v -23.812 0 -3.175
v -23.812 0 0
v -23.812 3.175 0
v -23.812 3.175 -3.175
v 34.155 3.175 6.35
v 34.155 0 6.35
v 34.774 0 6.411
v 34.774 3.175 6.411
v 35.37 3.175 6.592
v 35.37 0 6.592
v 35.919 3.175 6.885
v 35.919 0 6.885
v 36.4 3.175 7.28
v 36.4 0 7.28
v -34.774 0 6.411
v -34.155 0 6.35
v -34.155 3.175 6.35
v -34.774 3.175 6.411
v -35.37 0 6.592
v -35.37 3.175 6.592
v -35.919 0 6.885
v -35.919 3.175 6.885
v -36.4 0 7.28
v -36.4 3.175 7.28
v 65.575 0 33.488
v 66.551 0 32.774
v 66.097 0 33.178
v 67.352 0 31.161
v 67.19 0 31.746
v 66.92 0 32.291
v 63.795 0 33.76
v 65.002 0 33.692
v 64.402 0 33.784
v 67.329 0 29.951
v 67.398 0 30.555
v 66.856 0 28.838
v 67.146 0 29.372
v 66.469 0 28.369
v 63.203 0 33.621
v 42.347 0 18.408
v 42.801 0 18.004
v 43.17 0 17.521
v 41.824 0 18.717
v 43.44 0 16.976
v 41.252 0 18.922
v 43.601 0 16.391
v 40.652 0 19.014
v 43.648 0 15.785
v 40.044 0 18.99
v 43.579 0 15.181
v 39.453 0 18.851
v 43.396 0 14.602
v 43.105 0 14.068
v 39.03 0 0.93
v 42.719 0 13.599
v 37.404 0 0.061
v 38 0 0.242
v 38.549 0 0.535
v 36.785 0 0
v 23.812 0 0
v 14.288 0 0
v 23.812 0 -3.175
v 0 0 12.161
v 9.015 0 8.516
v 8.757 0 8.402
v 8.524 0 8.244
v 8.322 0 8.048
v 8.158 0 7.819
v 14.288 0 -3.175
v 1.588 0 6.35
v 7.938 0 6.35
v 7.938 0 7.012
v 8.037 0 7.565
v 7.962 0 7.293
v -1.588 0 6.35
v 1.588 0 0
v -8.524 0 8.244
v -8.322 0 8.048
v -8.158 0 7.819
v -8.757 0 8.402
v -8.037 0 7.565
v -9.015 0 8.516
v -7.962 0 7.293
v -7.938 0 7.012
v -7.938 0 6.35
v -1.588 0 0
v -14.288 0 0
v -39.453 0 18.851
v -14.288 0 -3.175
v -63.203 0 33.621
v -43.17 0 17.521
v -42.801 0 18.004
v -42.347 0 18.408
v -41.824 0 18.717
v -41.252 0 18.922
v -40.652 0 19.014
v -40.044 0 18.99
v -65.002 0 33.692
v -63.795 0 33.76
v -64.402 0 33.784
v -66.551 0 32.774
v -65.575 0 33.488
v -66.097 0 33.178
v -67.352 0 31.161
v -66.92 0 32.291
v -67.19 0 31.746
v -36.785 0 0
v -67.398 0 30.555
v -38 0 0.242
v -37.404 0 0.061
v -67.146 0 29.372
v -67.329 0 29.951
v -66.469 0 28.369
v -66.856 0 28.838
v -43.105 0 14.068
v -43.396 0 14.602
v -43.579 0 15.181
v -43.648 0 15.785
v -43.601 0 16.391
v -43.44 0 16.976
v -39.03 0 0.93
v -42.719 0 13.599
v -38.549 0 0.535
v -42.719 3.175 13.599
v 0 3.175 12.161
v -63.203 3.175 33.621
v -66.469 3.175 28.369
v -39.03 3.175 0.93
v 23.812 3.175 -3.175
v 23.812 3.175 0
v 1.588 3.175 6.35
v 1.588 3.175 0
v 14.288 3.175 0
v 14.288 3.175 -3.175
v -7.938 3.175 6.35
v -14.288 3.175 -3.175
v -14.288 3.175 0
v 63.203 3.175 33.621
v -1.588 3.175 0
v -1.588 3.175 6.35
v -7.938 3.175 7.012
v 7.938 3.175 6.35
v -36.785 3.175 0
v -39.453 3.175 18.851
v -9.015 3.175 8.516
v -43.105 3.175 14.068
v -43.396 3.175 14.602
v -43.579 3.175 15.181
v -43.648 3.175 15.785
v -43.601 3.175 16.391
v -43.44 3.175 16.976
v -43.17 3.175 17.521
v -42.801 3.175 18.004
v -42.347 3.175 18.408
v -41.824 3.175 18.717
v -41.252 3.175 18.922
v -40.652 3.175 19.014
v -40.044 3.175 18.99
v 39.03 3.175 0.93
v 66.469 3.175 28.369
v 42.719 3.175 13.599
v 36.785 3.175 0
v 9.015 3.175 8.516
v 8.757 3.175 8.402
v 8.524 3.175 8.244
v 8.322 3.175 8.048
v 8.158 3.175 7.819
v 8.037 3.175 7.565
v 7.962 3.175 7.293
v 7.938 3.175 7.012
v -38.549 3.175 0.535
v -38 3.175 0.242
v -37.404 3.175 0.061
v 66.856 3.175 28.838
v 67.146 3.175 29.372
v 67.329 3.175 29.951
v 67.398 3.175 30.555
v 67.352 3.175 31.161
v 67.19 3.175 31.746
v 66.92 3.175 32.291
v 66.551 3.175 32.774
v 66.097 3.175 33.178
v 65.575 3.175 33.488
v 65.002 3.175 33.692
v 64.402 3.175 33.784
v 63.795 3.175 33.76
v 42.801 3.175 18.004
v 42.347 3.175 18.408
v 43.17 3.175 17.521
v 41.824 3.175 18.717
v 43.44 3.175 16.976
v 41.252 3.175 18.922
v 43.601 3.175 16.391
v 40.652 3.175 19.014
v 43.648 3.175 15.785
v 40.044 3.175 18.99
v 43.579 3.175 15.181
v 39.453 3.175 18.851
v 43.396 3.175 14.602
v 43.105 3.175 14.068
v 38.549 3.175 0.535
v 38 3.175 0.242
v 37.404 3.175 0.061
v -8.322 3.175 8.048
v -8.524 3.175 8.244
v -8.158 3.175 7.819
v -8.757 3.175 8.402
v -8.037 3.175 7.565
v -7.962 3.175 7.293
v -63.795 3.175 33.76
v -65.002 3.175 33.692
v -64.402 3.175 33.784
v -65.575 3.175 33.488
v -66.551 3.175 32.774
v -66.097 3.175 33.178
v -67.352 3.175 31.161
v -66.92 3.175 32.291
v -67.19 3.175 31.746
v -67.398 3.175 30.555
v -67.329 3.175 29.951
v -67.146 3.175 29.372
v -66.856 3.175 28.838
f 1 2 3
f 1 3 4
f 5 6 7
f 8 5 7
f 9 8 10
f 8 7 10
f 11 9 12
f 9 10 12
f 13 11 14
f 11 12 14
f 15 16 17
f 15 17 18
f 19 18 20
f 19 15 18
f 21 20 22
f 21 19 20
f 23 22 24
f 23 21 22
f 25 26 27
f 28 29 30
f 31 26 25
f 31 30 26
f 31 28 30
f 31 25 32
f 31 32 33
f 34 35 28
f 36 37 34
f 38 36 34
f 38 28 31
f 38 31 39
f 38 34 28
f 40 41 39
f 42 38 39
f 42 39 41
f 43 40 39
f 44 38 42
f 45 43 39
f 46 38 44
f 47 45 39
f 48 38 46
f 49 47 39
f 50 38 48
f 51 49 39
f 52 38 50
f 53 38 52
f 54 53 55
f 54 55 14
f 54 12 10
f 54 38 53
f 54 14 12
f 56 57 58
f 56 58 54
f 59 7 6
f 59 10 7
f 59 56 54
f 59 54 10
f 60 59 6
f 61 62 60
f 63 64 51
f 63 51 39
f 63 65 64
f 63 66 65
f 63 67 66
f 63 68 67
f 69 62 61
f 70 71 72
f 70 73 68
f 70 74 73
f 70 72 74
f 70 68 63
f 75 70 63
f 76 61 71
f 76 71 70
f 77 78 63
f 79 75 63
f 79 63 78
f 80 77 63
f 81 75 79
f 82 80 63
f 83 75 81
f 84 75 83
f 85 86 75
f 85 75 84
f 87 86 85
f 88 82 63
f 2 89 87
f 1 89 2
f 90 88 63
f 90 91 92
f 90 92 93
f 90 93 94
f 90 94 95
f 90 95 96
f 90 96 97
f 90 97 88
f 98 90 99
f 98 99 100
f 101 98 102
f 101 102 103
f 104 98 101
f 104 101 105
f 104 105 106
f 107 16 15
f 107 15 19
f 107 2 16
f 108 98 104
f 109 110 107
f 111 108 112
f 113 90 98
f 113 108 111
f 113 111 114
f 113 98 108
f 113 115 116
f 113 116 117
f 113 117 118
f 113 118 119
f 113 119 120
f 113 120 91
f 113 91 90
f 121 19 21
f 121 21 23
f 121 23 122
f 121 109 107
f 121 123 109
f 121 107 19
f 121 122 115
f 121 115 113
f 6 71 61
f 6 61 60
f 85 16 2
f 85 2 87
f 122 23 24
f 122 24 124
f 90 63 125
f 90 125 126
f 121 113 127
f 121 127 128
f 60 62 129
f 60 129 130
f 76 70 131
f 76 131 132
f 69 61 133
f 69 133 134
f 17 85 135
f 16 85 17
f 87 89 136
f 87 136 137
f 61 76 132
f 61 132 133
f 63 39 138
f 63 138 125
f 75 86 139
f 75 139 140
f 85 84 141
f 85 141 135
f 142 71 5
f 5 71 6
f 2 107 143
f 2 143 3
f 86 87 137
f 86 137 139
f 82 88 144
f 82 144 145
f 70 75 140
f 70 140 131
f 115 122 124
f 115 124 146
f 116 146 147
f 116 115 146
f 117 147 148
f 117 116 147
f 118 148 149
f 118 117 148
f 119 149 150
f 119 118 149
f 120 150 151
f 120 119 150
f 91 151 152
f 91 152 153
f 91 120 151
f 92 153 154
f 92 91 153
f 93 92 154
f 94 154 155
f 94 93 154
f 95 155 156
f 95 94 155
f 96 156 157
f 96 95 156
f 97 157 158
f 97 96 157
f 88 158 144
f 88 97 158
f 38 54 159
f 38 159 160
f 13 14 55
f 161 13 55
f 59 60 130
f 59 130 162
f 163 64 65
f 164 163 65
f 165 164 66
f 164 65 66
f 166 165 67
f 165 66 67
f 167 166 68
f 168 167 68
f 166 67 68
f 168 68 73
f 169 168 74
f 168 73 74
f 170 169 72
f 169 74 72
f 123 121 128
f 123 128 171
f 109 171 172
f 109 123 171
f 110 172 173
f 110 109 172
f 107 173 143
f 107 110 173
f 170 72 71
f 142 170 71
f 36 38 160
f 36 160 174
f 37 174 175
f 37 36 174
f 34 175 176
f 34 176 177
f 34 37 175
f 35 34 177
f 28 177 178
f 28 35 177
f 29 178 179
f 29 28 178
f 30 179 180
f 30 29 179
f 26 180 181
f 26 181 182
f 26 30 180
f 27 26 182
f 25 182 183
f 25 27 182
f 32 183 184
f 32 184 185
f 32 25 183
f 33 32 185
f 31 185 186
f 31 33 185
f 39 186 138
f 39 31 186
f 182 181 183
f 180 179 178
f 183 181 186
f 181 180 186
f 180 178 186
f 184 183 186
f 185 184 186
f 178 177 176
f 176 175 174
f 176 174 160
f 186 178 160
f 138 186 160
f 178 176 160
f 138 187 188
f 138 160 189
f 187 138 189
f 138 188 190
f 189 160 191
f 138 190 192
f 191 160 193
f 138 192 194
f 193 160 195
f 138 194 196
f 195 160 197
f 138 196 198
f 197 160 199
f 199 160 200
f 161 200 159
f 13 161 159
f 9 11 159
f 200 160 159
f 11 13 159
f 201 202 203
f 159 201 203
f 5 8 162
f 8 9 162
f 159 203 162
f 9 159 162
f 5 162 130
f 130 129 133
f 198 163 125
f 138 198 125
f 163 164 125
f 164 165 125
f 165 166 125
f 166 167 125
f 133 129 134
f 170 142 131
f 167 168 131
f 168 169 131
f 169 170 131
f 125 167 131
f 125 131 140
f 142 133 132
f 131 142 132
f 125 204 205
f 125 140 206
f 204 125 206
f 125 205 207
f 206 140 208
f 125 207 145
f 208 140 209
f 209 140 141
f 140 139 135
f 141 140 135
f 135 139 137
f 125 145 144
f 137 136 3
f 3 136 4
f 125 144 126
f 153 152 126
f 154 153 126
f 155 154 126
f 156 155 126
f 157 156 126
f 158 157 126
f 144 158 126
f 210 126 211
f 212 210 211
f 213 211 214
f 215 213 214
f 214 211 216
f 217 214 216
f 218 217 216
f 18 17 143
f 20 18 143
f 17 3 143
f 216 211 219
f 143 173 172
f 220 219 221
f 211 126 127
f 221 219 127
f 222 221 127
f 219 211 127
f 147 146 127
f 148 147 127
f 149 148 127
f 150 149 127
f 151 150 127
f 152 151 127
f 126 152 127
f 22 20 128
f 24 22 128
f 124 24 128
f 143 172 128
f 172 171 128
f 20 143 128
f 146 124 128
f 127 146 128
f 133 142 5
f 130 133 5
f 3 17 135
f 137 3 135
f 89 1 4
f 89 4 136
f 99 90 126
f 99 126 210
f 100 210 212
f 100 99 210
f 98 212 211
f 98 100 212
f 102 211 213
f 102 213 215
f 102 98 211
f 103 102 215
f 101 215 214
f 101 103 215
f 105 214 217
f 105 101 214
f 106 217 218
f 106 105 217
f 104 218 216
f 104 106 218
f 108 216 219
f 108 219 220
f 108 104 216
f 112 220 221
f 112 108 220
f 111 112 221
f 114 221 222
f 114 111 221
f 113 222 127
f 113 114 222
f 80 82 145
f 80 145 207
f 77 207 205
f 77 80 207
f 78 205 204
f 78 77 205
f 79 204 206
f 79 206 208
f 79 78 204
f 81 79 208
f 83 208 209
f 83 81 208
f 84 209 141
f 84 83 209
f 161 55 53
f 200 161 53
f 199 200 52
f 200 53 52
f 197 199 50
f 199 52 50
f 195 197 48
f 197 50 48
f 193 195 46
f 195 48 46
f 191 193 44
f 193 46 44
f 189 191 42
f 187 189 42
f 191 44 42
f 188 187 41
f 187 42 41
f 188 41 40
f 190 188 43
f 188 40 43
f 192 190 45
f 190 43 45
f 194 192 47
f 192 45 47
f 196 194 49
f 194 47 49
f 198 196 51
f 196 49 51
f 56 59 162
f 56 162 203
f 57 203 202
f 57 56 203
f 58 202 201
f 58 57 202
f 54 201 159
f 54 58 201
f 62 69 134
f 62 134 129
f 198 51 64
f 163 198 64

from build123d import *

# Parameters (mm, degrees)
BOSS_EXTRUDE1_DEPTH = 3.175


with BuildPart() as part:
    # Sketch1 → Boss-Extrude1 (new body)
    with BuildSketch(Plane(origin=(0, 0, 0), x_dir=(1, 0, 0), z_dir=(0, 1, 0))):
        with BuildLine():
            Line((-36.784871939, 0), (-23.8125, 0))
            Line((-23.8125, 0), (-23.8125, 3.175))
            Line((-23.8125, 3.175), (-14.2875, 3.175))
            Line((-14.2875, 3.175), (-14.2875, 0))
            Line((-14.2875, 0), (-1.5875, 0))
            Line((-1.5875, 0), (-1.5875, -6.35))
            Line((-1.5875, -6.35), (1.5875, -6.35))
            Line((1.5875, -6.35), (1.5875, 0))
            Line((1.5875, 0), (14.2875, 0))
            Line((14.2875, 0), (14.2875, 3.175))
            Line((14.2875, 3.175), (23.8125, 3.175))
            Line((23.8125, 3.175), (23.8125, 0))
            Line((23.8125, 0), (36.784871939, 0))
            ThreePointArc((36.784871939, 0), (37.999891837, -0.241682484), (39.02993597, -0.92993597))
            Line((39.02993597, -0.92993597), (66.469065694, -28.369065694))
            ThreePointArc((66.469065694, -28.369065694), (66.920159512, -32.290840151), (63.203219493, -33.620560958))
            Line((63.203219493, -33.620560958), (0, -12.160991598))
            Line((0, -12.160991598), (-63.203219493, -33.620560958))
            ThreePointArc((-63.203219493, -33.620560958), (-66.920159512, -32.290840151), (-66.469065694, -28.369065694))
            Line((-66.469065694, -28.369065694), (-39.02993597, -0.92993597))
            ThreePointArc((-39.02993597, -0.92993597), (-37.999891837, -0.241682484), (-36.784871939, 0))
        make_face()
        with BuildLine():
            Line((-39.452913677, -18.850511262), (-9.014608915, -8.515706841))
            ThreePointArc((-9.014608915, -8.515706841), (-8.234573307, -7.9371291), (-7.9375, -7.012491225))
            Line((-7.9375, -7.012491225), (-7.9375, -6.35))
            Line((-7.9375, -6.35), (-34.154615818, -6.35))
            ThreePointArc((-34.154615818, -6.35), (-35.369635716, -6.591682484), (-36.399679849, -7.27993597))
            Line((-36.399679849, -7.27993597), (-42.718759878, -13.599015999))
            ThreePointArc((-42.718759878, -13.599015999), (-43.169853696, -17.520790456), (-39.452913677, -18.850511262))
        make_face(mode=Mode.SUBTRACT)
        with BuildLine():
            Line((39.452913677, -18.850511262), (9.014608915, -8.515706841))
            ThreePointArc((9.014608915, -8.515706841), (8.234573307, -7.9371291), (7.9375, -7.012491225))
            Line((7.9375, -7.012491225), (7.9375, -6.35))
            Line((7.9375, -6.35), (34.154615818, -6.35))
            ThreePointArc((34.154615818, -6.35), (35.369635716, -6.591682484), (36.399679849, -7.27993597))
            Line((36.399679849, -7.27993597), (42.718759878, -13.599015999))
            ThreePointArc((42.718759878, -13.599015999), (43.169853696, -17.520790456), (39.452913677, -18.850511262))
        make_face(mode=Mode.SUBTRACT)
    extrude(amount=BOSS_EXTRUDE1_DEPTH)


solid = part.part
